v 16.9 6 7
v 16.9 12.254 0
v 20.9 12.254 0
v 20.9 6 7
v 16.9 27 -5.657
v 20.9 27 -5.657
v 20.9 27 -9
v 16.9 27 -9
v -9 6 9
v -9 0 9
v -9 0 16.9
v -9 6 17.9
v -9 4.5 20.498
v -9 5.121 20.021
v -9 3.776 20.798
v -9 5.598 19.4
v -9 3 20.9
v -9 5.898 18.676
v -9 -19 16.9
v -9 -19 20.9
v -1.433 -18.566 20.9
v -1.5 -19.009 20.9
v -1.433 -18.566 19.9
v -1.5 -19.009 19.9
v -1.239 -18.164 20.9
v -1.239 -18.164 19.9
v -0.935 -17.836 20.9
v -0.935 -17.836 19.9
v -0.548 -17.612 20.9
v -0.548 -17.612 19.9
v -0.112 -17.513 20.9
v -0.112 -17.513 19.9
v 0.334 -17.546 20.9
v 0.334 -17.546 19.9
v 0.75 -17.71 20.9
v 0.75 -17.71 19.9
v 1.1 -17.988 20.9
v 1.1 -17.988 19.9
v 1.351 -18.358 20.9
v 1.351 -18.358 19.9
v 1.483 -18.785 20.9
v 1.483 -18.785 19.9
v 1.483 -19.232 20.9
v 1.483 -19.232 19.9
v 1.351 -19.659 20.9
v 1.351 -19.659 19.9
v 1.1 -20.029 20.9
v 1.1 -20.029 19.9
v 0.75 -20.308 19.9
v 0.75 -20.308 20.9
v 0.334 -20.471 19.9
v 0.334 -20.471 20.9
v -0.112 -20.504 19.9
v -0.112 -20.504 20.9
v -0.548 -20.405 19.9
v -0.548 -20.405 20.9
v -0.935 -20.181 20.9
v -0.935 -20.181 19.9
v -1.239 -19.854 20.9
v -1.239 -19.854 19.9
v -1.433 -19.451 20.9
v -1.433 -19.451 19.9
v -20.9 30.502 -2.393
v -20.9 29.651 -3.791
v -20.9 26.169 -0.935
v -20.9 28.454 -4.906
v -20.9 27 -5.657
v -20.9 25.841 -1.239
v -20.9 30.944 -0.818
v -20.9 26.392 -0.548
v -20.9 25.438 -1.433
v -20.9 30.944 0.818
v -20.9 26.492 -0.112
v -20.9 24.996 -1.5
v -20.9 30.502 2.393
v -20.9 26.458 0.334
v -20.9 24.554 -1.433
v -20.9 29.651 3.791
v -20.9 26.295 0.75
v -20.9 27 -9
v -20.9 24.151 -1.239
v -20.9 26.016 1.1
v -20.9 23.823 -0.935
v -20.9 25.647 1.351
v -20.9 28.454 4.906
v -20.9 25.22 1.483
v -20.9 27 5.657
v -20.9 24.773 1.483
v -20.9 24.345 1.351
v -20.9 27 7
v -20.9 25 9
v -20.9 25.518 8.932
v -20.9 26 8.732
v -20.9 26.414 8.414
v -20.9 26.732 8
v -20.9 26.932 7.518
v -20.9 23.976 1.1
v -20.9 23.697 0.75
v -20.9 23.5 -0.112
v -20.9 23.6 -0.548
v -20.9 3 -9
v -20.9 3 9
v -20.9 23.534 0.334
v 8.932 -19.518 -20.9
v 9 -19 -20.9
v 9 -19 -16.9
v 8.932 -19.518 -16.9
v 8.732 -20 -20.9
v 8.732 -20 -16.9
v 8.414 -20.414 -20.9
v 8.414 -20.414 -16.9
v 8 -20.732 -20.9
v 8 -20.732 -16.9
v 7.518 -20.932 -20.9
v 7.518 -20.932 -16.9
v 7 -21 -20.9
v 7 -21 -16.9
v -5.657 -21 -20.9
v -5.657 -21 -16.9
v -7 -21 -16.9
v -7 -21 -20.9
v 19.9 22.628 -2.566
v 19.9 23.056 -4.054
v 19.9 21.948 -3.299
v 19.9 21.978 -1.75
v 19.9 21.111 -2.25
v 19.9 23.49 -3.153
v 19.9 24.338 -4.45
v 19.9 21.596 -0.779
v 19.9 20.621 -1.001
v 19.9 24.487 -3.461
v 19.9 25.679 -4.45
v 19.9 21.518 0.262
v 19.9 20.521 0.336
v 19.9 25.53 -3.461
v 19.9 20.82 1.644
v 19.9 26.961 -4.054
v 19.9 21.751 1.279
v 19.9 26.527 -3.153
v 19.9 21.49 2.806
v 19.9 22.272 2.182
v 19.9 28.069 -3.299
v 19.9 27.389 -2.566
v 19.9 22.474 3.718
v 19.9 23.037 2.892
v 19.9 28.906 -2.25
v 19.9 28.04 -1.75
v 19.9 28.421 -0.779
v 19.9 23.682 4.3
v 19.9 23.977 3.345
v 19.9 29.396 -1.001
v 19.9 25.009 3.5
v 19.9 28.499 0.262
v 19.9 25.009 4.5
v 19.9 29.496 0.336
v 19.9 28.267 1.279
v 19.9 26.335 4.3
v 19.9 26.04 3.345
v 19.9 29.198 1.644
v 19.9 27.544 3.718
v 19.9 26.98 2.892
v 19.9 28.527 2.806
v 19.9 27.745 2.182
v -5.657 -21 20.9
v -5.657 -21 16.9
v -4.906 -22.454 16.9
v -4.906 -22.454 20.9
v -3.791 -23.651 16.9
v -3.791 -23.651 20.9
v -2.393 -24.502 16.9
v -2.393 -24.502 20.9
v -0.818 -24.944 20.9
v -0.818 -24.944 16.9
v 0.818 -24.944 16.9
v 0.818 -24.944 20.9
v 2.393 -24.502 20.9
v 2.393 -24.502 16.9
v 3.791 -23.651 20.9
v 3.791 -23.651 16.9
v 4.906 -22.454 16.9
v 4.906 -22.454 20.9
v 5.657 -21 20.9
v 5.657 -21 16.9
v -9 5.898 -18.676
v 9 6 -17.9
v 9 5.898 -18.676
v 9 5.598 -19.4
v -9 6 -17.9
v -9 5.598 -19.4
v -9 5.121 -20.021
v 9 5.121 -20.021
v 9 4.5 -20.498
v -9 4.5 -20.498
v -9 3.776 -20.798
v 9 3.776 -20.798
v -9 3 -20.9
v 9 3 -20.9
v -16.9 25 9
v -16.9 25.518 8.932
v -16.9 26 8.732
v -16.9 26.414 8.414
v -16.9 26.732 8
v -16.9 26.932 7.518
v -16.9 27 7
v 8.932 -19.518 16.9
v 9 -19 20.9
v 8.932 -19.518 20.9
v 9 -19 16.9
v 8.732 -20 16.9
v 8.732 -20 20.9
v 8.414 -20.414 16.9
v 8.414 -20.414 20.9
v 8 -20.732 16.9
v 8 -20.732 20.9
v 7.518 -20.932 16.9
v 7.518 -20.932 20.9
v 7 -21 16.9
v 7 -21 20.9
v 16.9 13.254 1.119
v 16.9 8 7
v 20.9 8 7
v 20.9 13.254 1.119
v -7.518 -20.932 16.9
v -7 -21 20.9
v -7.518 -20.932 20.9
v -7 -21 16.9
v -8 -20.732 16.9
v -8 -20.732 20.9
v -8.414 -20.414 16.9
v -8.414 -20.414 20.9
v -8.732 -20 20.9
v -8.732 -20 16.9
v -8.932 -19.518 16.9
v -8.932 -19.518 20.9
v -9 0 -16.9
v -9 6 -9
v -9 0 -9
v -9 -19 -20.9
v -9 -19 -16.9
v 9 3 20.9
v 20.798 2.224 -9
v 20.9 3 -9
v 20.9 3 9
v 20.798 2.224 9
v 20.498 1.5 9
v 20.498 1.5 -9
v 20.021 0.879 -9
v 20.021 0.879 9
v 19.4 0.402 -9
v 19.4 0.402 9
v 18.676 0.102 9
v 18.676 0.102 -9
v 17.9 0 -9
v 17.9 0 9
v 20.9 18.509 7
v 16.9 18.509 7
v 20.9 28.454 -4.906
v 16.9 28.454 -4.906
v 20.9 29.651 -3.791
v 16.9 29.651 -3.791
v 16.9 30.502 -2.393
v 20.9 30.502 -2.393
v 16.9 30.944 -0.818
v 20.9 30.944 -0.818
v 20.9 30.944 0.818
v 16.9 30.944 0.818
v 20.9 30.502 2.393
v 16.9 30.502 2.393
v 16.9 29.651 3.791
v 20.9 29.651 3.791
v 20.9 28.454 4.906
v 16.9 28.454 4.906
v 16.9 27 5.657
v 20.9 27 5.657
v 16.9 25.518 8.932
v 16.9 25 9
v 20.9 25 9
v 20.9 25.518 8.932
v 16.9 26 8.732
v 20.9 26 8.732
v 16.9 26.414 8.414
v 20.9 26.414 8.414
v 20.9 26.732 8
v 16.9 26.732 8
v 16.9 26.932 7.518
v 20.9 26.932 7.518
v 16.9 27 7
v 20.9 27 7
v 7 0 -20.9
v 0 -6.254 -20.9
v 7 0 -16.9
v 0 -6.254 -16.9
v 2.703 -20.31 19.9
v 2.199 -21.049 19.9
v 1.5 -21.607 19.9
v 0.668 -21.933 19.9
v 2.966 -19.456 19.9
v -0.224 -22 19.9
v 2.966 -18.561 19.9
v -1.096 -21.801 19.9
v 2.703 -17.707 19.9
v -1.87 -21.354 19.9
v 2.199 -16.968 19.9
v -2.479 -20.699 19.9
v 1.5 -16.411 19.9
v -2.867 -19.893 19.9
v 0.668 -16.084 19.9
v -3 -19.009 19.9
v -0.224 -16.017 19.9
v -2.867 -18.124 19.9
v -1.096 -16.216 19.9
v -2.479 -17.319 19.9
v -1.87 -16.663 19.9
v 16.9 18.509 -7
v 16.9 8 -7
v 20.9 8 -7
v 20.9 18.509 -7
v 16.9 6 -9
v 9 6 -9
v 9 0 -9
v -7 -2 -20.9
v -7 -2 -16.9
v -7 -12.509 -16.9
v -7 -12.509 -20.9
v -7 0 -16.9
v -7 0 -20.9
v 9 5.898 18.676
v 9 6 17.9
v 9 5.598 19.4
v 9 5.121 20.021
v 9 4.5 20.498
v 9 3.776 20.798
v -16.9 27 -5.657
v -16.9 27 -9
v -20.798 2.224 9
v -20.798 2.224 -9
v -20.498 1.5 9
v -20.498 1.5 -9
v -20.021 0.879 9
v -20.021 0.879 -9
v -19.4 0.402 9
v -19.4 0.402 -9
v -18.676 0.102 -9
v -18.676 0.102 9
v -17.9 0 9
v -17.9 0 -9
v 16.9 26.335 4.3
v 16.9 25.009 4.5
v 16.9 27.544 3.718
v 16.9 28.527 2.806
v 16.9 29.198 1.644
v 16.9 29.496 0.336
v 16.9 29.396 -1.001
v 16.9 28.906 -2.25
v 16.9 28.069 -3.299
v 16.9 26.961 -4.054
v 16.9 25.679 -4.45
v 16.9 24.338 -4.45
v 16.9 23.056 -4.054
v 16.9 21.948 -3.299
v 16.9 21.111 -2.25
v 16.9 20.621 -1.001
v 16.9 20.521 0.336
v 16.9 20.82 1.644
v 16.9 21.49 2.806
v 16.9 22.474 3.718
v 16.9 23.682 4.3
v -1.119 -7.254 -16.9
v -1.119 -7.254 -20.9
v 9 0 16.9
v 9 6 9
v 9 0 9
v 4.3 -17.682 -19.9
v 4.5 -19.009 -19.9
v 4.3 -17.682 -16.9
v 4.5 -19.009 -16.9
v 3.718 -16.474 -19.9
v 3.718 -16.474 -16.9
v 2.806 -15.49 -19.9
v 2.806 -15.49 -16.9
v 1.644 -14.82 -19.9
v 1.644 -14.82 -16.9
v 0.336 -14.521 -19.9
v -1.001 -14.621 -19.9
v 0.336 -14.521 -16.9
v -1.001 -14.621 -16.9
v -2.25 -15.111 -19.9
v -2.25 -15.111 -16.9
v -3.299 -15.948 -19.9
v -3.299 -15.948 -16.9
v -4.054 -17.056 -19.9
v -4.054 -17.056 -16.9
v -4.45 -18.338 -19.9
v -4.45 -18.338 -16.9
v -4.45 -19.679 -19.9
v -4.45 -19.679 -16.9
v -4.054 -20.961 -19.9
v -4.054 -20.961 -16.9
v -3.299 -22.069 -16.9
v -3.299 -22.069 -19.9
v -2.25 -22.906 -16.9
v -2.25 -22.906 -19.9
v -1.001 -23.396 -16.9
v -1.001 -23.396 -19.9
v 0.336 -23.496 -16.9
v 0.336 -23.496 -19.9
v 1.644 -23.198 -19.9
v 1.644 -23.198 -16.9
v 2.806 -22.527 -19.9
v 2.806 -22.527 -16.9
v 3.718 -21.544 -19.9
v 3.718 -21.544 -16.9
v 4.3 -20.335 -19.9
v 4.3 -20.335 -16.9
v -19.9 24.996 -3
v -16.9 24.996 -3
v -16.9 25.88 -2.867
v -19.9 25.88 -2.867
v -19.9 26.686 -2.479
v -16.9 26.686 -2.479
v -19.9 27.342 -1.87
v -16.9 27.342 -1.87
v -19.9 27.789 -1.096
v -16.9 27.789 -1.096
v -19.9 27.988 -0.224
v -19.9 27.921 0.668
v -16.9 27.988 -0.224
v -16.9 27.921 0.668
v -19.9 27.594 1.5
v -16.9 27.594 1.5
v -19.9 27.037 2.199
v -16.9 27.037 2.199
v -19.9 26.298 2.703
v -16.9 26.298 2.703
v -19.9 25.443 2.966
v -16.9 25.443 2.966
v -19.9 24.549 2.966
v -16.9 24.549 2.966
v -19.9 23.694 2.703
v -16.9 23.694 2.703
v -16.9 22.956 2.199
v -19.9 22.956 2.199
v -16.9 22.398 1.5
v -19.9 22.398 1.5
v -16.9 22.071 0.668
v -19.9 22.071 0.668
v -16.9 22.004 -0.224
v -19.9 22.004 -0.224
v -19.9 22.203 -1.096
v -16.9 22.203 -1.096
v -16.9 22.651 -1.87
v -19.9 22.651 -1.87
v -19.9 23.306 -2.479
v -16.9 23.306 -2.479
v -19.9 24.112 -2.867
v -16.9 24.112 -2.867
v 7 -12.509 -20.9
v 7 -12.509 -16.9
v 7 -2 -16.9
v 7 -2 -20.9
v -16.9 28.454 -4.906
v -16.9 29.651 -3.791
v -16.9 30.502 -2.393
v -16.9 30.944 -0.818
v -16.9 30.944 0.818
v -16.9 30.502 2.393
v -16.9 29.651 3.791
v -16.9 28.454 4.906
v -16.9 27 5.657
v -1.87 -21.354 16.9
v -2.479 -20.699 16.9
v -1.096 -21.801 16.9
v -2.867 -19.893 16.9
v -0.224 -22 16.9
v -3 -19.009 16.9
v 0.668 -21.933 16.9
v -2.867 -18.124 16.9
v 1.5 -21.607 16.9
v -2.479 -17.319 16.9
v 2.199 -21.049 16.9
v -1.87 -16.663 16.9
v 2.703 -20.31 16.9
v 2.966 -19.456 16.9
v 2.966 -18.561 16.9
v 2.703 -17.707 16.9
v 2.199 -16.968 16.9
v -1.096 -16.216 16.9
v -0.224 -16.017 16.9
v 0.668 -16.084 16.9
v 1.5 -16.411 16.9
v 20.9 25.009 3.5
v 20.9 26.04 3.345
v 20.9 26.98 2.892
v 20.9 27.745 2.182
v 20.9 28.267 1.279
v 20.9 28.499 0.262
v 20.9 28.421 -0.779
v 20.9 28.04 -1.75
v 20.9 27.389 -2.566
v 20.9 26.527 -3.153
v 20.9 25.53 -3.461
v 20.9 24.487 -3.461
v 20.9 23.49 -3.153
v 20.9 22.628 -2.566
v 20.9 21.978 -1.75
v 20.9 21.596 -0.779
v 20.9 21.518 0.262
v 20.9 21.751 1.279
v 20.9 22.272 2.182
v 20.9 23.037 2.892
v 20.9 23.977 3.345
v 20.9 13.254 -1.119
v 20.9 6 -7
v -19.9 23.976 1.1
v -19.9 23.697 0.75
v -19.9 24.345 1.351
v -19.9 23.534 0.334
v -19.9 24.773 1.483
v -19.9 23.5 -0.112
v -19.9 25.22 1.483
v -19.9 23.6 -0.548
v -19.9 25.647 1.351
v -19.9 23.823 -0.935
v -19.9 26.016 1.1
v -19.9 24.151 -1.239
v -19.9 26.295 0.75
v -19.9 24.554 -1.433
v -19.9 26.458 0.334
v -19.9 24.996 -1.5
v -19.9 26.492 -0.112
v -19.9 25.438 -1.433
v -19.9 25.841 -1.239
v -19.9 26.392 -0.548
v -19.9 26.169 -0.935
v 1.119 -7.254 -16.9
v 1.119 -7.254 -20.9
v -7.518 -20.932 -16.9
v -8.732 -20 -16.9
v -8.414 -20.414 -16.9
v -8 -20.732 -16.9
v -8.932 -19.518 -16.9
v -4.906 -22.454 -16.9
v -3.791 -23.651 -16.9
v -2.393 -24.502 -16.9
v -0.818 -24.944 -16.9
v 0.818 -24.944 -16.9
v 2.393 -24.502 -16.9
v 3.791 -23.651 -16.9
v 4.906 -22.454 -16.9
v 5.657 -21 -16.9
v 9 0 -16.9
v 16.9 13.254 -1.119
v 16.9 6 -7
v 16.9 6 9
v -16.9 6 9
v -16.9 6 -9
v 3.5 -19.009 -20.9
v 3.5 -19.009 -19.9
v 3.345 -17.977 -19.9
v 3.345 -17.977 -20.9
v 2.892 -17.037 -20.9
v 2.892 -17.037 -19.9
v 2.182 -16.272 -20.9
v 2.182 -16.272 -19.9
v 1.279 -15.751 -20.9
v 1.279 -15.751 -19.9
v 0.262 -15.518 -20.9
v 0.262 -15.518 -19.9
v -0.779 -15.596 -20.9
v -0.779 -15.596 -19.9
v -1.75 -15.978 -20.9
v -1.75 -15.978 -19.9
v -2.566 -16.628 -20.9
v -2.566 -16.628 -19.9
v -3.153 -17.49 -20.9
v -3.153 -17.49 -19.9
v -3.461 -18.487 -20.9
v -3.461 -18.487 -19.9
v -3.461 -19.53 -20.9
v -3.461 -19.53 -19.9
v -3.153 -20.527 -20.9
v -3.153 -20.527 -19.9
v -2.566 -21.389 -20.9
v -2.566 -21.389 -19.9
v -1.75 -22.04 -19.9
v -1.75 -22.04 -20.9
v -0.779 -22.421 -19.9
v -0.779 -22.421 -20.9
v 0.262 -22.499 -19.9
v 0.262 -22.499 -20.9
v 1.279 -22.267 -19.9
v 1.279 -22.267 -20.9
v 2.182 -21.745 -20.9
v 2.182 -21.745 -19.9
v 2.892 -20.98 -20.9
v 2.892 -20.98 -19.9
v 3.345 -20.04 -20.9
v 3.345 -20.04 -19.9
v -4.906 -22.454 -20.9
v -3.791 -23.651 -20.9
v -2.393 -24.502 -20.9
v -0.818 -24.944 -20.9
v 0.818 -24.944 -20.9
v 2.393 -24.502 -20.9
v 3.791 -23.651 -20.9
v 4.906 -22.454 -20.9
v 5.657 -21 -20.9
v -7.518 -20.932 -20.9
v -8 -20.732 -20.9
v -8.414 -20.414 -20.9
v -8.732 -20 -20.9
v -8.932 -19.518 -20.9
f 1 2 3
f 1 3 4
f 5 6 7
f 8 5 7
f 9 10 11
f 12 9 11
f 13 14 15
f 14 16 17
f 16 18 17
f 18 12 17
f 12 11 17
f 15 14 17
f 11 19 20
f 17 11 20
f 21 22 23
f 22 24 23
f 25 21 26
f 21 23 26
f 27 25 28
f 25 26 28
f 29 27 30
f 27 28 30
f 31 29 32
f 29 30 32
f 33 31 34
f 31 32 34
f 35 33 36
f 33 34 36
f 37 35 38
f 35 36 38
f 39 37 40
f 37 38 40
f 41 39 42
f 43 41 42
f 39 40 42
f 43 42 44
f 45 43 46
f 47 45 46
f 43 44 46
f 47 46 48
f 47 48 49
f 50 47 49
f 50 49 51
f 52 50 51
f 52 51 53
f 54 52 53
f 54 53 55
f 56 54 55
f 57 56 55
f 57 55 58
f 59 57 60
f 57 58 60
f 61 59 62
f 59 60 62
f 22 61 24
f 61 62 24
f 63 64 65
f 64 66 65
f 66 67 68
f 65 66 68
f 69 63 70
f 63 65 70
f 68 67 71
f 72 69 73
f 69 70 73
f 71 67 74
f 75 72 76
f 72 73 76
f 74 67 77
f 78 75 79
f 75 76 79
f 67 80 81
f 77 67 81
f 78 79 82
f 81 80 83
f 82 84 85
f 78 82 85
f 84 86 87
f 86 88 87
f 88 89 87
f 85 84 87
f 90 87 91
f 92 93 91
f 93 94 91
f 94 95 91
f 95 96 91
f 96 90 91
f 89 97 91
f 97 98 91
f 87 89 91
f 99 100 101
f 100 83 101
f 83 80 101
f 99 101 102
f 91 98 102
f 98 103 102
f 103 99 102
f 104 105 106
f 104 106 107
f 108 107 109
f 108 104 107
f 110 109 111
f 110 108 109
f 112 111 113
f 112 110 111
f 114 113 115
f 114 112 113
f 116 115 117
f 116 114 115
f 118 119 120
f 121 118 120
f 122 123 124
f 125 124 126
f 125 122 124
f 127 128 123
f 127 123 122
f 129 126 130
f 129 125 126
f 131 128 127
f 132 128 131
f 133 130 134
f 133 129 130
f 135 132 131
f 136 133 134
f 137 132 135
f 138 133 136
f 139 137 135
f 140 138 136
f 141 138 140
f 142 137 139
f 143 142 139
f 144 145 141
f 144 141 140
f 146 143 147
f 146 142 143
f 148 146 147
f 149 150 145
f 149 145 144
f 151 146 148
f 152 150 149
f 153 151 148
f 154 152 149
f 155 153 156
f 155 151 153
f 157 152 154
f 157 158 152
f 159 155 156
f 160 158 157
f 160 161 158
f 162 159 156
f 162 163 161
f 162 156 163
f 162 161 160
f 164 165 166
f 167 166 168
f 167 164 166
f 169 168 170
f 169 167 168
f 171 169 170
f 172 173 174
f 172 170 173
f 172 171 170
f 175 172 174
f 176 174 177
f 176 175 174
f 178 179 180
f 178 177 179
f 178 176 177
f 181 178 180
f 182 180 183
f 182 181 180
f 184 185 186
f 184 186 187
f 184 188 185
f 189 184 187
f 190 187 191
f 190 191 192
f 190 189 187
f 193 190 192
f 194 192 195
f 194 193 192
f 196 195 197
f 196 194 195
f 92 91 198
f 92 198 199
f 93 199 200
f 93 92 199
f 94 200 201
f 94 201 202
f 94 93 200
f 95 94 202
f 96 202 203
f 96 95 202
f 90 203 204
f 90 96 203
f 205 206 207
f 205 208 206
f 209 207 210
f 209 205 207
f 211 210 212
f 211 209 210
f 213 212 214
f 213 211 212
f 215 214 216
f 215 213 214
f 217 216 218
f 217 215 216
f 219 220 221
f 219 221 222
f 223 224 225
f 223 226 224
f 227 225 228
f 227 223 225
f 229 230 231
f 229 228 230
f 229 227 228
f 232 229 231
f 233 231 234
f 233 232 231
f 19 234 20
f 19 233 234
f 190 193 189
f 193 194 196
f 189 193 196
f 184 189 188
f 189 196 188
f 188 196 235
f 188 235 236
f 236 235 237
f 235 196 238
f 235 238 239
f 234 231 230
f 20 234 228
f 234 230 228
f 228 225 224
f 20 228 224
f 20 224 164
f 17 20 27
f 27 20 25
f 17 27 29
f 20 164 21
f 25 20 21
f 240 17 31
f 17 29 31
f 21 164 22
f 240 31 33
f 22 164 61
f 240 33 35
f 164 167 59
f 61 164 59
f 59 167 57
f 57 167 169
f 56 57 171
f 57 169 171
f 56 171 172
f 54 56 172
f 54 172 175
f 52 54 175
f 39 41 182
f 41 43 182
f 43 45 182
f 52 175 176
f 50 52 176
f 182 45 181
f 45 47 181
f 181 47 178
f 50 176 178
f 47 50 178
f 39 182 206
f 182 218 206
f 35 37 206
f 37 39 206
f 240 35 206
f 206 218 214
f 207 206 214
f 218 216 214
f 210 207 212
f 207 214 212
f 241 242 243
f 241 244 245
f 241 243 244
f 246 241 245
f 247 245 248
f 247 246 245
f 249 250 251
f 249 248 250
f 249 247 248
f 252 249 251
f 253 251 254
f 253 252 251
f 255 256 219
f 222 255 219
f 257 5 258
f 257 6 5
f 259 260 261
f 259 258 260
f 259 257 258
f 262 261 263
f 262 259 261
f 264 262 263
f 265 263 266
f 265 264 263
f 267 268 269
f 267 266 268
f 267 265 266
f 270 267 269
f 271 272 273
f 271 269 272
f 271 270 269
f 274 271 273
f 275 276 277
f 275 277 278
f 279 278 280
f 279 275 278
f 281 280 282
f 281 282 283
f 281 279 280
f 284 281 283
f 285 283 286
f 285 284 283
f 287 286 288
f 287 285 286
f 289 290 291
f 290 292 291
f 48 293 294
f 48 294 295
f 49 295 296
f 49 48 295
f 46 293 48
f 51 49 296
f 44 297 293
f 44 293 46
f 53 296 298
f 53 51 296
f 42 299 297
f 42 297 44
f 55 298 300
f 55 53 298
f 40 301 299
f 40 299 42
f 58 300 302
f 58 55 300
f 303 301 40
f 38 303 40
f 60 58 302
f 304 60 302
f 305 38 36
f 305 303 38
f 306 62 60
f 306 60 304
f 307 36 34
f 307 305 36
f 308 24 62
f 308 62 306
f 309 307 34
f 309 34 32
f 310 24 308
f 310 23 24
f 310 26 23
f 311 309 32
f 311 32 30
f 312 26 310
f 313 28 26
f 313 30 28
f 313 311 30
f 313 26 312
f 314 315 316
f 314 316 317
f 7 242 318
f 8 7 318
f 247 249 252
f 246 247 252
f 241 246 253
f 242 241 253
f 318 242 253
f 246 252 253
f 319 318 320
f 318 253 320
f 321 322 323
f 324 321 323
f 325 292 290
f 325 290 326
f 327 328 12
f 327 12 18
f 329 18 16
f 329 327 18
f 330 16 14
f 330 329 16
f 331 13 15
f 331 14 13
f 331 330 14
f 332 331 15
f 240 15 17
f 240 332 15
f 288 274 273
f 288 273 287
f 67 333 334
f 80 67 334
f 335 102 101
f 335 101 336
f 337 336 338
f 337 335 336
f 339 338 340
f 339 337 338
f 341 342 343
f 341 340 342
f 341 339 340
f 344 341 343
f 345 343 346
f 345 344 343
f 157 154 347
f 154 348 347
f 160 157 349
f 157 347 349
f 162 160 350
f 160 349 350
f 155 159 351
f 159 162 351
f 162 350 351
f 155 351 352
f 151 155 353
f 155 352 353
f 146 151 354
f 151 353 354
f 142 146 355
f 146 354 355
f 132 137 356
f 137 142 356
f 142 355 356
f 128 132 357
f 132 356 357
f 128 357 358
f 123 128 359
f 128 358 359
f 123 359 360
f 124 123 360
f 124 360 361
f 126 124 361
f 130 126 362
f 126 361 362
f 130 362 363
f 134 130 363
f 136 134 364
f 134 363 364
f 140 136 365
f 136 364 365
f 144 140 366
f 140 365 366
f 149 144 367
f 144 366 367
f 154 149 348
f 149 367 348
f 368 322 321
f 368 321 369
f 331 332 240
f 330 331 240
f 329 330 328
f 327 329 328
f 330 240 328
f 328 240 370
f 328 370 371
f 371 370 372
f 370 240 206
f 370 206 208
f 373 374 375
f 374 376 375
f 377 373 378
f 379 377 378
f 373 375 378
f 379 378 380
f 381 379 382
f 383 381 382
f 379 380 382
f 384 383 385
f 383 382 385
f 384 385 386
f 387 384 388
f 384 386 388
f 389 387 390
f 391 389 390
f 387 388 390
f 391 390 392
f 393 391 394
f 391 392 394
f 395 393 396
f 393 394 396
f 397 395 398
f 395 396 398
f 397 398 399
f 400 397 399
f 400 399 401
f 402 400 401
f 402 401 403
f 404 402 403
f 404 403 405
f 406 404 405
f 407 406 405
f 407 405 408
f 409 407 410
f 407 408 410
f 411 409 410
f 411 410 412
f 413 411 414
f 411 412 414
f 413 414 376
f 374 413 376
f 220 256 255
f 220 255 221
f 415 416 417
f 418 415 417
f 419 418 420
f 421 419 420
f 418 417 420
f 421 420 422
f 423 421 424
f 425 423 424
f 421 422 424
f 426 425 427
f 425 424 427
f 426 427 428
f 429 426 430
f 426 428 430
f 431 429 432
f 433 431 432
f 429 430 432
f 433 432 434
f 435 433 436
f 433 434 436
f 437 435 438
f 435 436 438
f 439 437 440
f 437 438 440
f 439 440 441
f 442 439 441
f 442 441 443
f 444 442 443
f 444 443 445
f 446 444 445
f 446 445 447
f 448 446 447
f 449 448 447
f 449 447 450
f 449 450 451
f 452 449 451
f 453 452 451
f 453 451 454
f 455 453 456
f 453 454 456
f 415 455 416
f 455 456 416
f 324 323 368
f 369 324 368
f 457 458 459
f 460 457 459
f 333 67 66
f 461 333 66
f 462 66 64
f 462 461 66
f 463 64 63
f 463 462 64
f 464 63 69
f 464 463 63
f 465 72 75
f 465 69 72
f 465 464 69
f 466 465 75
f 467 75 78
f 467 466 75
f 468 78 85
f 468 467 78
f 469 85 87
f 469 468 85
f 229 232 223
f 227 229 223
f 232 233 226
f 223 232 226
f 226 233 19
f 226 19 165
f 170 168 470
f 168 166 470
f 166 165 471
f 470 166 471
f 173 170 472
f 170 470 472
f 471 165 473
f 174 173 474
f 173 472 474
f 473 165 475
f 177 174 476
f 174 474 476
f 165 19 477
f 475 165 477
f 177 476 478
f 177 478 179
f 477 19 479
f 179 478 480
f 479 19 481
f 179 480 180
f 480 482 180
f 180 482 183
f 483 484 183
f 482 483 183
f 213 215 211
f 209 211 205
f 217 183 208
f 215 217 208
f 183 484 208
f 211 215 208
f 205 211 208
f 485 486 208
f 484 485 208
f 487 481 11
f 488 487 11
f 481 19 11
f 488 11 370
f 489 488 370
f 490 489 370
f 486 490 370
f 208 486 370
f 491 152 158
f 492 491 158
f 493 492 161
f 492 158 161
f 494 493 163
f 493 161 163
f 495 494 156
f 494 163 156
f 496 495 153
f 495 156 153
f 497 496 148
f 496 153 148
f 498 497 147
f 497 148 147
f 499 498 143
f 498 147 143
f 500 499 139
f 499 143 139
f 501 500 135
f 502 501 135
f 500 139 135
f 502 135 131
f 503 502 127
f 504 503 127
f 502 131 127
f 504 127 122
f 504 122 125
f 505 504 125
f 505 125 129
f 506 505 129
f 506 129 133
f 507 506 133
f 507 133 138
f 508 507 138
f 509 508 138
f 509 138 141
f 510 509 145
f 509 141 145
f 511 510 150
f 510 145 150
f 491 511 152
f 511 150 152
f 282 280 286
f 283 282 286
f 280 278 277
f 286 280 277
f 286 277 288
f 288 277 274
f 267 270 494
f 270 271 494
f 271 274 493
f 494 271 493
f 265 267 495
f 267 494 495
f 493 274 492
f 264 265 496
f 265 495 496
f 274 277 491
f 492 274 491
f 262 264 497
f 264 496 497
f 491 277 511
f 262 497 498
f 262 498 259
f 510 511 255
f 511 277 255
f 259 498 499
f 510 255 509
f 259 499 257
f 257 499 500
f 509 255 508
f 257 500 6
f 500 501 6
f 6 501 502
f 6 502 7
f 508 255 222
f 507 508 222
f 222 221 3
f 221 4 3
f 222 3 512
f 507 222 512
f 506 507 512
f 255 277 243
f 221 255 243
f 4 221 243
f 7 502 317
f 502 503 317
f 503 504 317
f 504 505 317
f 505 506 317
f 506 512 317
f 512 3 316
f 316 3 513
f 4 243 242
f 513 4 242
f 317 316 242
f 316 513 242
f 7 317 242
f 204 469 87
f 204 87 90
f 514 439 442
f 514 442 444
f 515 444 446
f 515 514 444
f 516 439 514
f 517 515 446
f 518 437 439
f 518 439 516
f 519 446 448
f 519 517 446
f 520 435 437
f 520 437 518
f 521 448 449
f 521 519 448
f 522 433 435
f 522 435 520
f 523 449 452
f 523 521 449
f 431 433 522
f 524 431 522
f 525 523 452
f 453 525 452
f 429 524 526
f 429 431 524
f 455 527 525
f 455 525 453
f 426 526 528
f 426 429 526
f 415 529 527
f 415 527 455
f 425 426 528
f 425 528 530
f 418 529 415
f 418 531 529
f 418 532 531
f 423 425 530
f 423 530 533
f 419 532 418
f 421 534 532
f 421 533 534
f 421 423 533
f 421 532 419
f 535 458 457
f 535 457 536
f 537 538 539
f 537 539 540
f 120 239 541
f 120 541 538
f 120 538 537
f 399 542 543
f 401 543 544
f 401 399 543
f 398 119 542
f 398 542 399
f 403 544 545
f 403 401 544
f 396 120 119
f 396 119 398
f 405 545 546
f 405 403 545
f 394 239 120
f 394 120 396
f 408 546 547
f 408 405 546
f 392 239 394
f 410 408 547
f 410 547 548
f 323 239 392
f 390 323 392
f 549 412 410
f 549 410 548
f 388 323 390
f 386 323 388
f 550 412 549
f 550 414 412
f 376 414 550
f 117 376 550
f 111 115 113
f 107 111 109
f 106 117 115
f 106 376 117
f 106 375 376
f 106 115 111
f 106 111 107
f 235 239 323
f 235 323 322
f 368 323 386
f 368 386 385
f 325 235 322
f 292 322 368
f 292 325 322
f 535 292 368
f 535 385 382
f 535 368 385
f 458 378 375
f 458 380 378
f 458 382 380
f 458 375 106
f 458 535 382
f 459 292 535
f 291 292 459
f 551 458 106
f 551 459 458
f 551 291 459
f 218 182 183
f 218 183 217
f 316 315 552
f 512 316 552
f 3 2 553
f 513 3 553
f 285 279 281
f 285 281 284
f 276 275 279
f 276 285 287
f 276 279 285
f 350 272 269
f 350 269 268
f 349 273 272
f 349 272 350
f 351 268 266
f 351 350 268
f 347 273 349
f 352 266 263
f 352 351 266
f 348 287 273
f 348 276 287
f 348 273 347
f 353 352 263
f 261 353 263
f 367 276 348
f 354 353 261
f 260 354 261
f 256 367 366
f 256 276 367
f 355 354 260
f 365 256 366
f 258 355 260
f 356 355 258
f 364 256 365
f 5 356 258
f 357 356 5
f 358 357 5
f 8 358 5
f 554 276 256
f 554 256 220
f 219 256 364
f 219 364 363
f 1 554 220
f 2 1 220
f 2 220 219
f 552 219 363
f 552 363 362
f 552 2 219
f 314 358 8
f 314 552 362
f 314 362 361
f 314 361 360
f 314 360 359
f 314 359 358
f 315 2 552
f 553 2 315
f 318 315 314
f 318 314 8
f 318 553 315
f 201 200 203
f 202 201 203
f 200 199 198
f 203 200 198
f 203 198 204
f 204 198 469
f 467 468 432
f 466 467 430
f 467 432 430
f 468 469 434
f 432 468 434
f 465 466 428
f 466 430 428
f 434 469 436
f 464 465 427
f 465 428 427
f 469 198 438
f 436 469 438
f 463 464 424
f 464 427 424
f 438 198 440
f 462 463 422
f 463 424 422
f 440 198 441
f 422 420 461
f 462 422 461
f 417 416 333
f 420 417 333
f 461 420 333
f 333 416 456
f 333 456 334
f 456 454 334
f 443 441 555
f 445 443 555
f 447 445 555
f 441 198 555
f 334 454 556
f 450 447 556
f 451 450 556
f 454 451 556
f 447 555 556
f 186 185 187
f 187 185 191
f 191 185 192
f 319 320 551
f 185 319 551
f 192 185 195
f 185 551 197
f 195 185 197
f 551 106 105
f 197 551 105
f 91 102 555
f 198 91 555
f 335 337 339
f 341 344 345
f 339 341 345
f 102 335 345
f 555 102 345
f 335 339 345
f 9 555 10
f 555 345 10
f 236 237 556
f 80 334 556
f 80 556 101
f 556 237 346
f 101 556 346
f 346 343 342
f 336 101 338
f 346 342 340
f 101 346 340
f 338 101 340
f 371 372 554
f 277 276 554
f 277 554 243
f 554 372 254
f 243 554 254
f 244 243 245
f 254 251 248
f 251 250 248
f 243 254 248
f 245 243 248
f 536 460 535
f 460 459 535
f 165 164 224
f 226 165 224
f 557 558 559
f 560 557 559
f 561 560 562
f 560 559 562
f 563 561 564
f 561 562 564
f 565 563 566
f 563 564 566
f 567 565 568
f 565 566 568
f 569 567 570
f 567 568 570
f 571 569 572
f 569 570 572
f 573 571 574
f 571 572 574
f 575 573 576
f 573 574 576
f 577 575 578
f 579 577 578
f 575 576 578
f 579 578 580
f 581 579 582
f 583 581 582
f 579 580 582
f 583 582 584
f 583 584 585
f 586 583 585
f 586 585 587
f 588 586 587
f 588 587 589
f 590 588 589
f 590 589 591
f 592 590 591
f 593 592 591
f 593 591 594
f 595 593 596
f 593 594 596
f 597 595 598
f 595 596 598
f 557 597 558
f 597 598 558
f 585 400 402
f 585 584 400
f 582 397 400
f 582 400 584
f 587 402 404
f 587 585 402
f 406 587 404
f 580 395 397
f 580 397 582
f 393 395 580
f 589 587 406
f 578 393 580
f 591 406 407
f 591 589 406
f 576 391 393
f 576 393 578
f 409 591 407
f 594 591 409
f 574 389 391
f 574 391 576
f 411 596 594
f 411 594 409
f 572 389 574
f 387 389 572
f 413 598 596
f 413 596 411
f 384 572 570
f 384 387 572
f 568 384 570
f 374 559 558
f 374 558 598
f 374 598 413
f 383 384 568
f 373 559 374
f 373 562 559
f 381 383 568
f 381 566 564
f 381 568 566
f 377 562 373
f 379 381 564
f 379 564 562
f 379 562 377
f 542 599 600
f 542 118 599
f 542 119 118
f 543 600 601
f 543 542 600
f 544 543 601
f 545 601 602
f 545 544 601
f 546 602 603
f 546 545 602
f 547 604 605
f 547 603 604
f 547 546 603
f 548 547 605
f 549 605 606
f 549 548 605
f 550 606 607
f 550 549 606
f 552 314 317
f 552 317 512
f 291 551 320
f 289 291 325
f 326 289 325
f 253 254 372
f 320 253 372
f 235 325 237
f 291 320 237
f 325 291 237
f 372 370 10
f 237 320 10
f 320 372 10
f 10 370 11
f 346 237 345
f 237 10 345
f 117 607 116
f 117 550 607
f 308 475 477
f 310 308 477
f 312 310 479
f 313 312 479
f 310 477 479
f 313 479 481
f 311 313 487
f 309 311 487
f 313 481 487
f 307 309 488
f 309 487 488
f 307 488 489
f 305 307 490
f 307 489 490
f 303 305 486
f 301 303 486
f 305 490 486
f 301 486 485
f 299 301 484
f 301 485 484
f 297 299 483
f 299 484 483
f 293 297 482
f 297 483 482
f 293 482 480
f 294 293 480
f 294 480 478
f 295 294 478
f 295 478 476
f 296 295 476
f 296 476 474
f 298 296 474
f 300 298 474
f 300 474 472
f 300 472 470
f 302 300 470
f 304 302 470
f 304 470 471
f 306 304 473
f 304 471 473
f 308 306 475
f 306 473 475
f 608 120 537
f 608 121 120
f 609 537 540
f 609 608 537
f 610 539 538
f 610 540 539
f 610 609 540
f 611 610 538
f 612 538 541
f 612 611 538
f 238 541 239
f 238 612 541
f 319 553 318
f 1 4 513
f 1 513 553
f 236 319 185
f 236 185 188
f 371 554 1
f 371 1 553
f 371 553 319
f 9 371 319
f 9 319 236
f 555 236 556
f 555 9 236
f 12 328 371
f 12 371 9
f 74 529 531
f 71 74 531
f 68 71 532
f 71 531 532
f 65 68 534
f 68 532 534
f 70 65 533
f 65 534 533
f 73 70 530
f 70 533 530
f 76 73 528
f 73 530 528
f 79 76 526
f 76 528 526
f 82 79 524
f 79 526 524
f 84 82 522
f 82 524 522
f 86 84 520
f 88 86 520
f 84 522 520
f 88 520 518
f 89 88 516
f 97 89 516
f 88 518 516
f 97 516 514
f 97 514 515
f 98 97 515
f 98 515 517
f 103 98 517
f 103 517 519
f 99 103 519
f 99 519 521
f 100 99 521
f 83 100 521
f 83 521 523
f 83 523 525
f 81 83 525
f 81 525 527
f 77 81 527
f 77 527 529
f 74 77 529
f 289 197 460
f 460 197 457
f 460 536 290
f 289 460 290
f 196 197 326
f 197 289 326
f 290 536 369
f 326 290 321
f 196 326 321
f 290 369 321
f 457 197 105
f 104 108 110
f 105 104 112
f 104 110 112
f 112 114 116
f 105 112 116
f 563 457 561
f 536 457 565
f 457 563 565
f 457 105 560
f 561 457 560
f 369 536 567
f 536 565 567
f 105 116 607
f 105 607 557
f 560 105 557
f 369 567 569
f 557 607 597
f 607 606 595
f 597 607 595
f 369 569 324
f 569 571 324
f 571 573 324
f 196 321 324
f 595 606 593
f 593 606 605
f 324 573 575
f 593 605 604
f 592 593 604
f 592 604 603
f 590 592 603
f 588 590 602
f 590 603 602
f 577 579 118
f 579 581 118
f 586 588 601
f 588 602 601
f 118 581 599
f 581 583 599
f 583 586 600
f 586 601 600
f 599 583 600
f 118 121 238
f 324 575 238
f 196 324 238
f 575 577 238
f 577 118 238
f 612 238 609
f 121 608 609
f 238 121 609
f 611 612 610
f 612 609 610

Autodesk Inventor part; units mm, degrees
ref_plane "YZ Plane" through (0, 0, 0) normal (1, 0, 0) x (0, 1, 0)
ref_plane "XZ Plane" through (0, 0, 0) normal (0, 1, 0) x (-1, 0, 0)
ref_plane "XY Plane" through (0, 0, 0) normal (0, 0, 1) x (1, 0, 0)
sketch "スケッチ1" plane through (0, 0, 0) normal (0, 1, 0) x (-1, 0, 0)
  line L0 (9, 20.9) -> (-9, 20.9)
  line L1 (-9, -20.9) -> (9, -20.9)
  line L2 (9, 20.9) -> (-9, -20.9) construction
  line L3 (-9, 20.9) -> (9, -20.9) construction
  line L4 (-20.9, 9) -> (-20.9, -9)
  line L5 (20.9, -9) -> (20.9, 9)
  line L6 (20.9, 9) -> (-20.9, -9) construction
  line L7 (-20.9, 9) -> (20.9, -9) construction
  line L8 (20.9, 9) -> (9, 9)
  line L9 (-9, 9) -> (-20.9, 9)
  line L10 (9, 9) -> (9, 20.9)
  line L11 (-9, 20.9) -> (-9, 9)
  line L12 (-9, -9) -> (-9, -20.9)
  line L13 (-20.9, -9) -> (-9, -9)
  line L14 (9, -9) -> (20.9, -9)
  line L15 (9, -20.9) -> (9, -9)
  point P0 (0, 0)
  dimension "d0" = 18
  dimension "d1" = 41.8
  dimension "d2" = 41.8
  dimension "d3" = 18
extrude "押し出し1" add sketch "スケッチ1" along normal blind 6
sketch "スケッチ2" plane through (0, 6, 0) normal (0, 1, 0) x (1, 0, 0)
  line L0 (-20.9, -9) -> (-9, -9) projected
  line L1 (-9, 9) -> (-20.9, 9) projected
  line L2 (-20.9, -9) -> (-16.9, -9)
  line L3 (-16.9, -9) -> (-16.9, 9)
  line L4 (-16.9, 9) -> (-20.9, 9)
  line L5 (-20.9, 9) -> (-20.9, -9)
  line L6 (20.9, -9) -> (20.9, 9) projected
  line L7 (20.9, 9) -> (9, 9) projected
  line L8 (20.9, -9) -> (16.9, -9)
  line L9 (16.9, -9) -> (16.9, 9)
  line L10 (16.9, 9) -> (20.9, 9)
  line L11 (20.9, 9) -> (20.9, -9)
  point P0 (0, 0)
  dimension "d6" = 4
  dimension "d7" = 4
extrude "押し出し2" add sketch "スケッチ2" along normal blind 25
sketch "スケッチ3" plane through (0, 0, 0) normal (0, -1, 0) x (1, 0, 0)
  line L0 (-9, 20.9) -> (9, 20.9) projected
  line L1 (-9, 9) -> (-9, 20.9) projected
  line L2 (9, 20.9) -> (-9, 20.9)
  line L3 (-9, 20.9) -> (-9, 16.9)
  line L4 (-9, 16.9) -> (9, 16.9)
  line L5 (9, 16.9) -> (9, 20.9)
  line L6 (9, -9) -> (9, -20.9) projected
  line L7 (-9, -20.9) -> (-9, -9) projected
  line L8 (9, -20.9) -> (-9, -20.9)
  line L9 (-9, -20.9) -> (-9, -16.9)
  line L10 (-9, -16.9) -> (9, -16.9)
  line L11 (9, -16.9) -> (9, -20.9)
  point P0 (0, 0)
  dimension "d10" = 4
  dimension "d11" = 4
extrude "押し出し3" add sketch "スケッチ3" along normal blind 25
sketch "スケッチ4" plane through (20.9, 0, 9) normal (1, 0, 0) x (0, 0, -1)
  line L0 (9, 0) -> (9, 25) construction
  line L1 (9, 25) -> (15, 25) construction
  line L2 (9, 25) -> (0, 25) construction
  line L3 (0, 6) -> (0, 31) construction
  line L4 (0, 25) -> (2, 25) construction
  line L5 (9, 25) -> (18, 25) construction
  line L6 (18, 0) -> (18, 31) construction
  line L7 (18, 25) -> (16, 25) construction
  line L8 (2, 25) -> (0, 25) construction
  line L9 (18, 31) -> (0, 31) construction
  line L10 (9, 25) -> (9, 31) construction
  line L11 (0, 31) -> (18, 31) construction
  line L12 (0, 6) -> (0, 31) construction
  line L13 (0, 25) -> (0, 31) construction
  line L14 (18, 31) -> (0, 31) construction
  line L15 (0, 31) -> (18, 31) construction
  line L16 (18, 31) -> (18, 25) construction
  line L17 (0, 0) -> (0, 31) projected
  line L18 (0, 25) -> (0, 31)
  line L19 (0, 31) -> (18, 31)
  line L20 (18, 25) -> (18, 31)
  circle A0 centre (9, 25) radius 6
  line L21 (2, 27) -> (0, 27)
  line L22 (16, 27) -> (18, 27)
  line L23 (18, 6) -> (18, 31) projected
  line L24 (2, 27) -> (3.3431, 27)
  line L25 (14.6569, 27) -> (16, 27)
  circle A1 centre (9, 25) radius 1.5
  circle A2 centre (9, 25) radius 3
  dimension "d14" = 25
  dimension "d20" = 2
  dimension "d21" = 2
  dimension "d22" = 6
  dimension "d24" = 12
  dimension "d35" = 3
  dimension "d36" = 6
extrude "押し出し4" cut sketch "スケッチ4" against normal blind 41.8 contours L17 L19 A0 L24 L21 | L19 L20 L22 L25 A0
sketch "スケッチ5" plane through (-9, 6, 20.9) normal (0, 0, 1) x (1, 0, 0)
  line L0 (18, -31) -> (18, 0) projected
  line L1 (0, 0) -> (18, 0) projected
  line L2 (18, 0) -> (0, 0)
  line L3 (9, 0) -> (9, -25) construction
  line L4 (9, -25) -> (15, -25) construction
  line L5 (9, -25) -> (0, -25) construction
  line L6 (0, -6) -> (0, -31) construction
  line L7 (0, -25) -> (2, -25) construction
  line L8 (9, -25) -> (18, -25) construction
  line L9 (18, 0) -> (18, -31) construction
  line L10 (18, -25) -> (16, -25) construction
  line L11 (2, -25) -> (0, -25) construction
  line L12 (18, -31) -> (0, -31) construction
  line L13 (9, -25) -> (9, -31) construction
  line L14 (0, -31) -> (18, -31) construction
  line L15 (0, -6) -> (0, -31) construction
  line L16 (0, -25) -> (0, -31) construction
  line L17 (18, -31) -> (0, -31) construction
  line L18 (0, -31) -> (18, -31) construction
  line L19 (18, -31) -> (18, -25) construction
  line L20 (0, 0) -> (0, -31)
  line L21 (0, -25) -> (0, -31)
  line L22 (0, -31) -> (18, -31)
  line L23 (18, -25) -> (18, -31)
  circle A0 centre (9, -25) radius 6
  line L24 (2, -27) -> (0, -27)
  line L25 (16, -27) -> (18, -27)
  line L26 (18, -6) -> (18, -31)
  line L27 (2, -27) -> (3.3431, -27)
  line L28 (14.6569, -27) -> (16, -27)
  point P0 (9, -6)
extrude "押し出し5" cut sketch "スケッチ5" against normal blind 41.8 contours L22 A0 L28 L25 L0 | L22 L20 L24 L27 A0
sketch "スケッチ6" plane through (-16.9, 6, 9) normal (1, 0, 0) x (0, 0, -1)
  line L0 (9, -0.0039) -> (9, 18.9961) construction
  line L1 (9, 18.9961) -> (15, 18.9961) construction
  line L2 (9, 18.9961) -> (0, 18.9961) construction
  line L3 (0, -0.0039) -> (0, 24.9961) construction
  line L4 (0, 18.9961) -> (2, 18.9961) construction
  line L5 (9, 18.9961) -> (18, 18.9961) construction
  line L6 (18, 18.9961) -> (18, 24.9961) construction
  line L7 (18, 18.9961) -> (16, 18.9961) construction
  line L8 (2, 18.9961) -> (0, 18.9961) construction
  line L9 (18, 24.9961) -> (0, 24.9961) construction
  line L10 (9, 18.9961) -> (9, 24.9961) construction
  line L11 (0, 24.9961) -> (18, 24.9961) construction
  line L12 (0, -0.0039) -> (0, 24.9961) construction
  line L13 (0, 18.9961) -> (0, 24.9961) construction
  line L14 (18, 24.9961) -> (0, 24.9961) construction
  line L15 (0, 24.9961) -> (18, 24.9961) construction
  line L16 (18, 24.9961) -> (18, 18.9961) construction
  line L17 (0, 18.9961) -> (0, 24.9961)
  line L18 (0, 18.9961) -> (0, 24.9961)
  line L19 (0, 24.9961) -> (18, 24.9961)
  line L20 (18, 18.9961) -> (18, 24.9961)
  circle A0 centre (9, 18.9961) radius 6
  line L21 (2, 20.9961) -> (0, 20.9961)
  line L22 (16, 20.9961) -> (18, 20.9961)
  line L23 (18, -0.0039) -> (18, 24.9961)
  line L24 (2, 20.9961) -> (3.3431, 20.9961)
  line L25 (14.6569, 20.9961) -> (16, 20.9961)
  circle A1 centre (9, 18.9961) radius 1.5
  circle A2 centre (9, 18.9961) radius 3
  point P0 (9, -6)
  dimension "d37" = 19
  dimension "d38" = 2
  dimension "d39" = 2
  dimension "d40" = 6
  dimension "d41" = 12
  dimension "d42" = 3
  dimension "d43" = 6
extrude "押し出し6" cut sketch "スケッチ6" against normal blind 4 and the other way blind 4 contours A1
sketch "スケッチ7" plane through (-16.9, 6, 9) normal (1, 0, 0) x (0, 0, -1)
  line L0 (9, -0.0039) -> (9, 18.9961) construction
  line L1 (9, 18.9961) -> (15, 18.9961) construction
  line L2 (9, 18.9961) -> (0, 18.9961) construction
  line L3 (0, -0.0039) -> (0, 24.9961) construction
  line L4 (0, 18.9961) -> (2, 18.9961) construction
  line L5 (9, 18.9961) -> (18, 18.9961) construction
  line L6 (18, 18.9961) -> (18, 24.9961) construction
  line L7 (18, 18.9961) -> (16, 18.9961) construction
  line L8 (2, 18.9961) -> (0, 18.9961) construction
  line L9 (18, 24.9961) -> (0, 24.9961) construction
  line L10 (9, 18.9961) -> (9, 24.9961) construction
  line L11 (0, 24.9961) -> (18, 24.9961) construction
  line L12 (0, -0.0039) -> (0, 24.9961) construction
  line L13 (0, 18.9961) -> (0, 24.9961) construction
  line L14 (18, 24.9961) -> (0, 24.9961) construction
  line L15 (0, 24.9961) -> (18, 24.9961) construction
  line L16 (18, 24.9961) -> (18, 18.9961) construction
  line L17 (0, 18.9961) -> (0, 24.9961)
  line L18 (0, 18.9961) -> (0, 24.9961)
  line L19 (0, 24.9961) -> (18, 24.9961)
  line L20 (18, 18.9961) -> (18, 24.9961)
  circle A0 centre (9, 18.9961) radius 6
  line L21 (2, 20.9961) -> (0, 20.9961)
  line L22 (16, 20.9961) -> (18, 20.9961)
  line L23 (18, -0.0039) -> (18, 24.9961)
  line L24 (2, 20.9961) -> (3.3431, 20.9961)
  line L25 (14.6569, 20.9961) -> (16, 20.9961)
  circle A1 centre (9, 18.9961) radius 1.5
  circle A2 centre (9, 18.9961) radius 3
  point P0 (9, -6)
  point P1 (9, -6)
  dimension "d48" = 19
  dimension "d49" = 2
  dimension "d50" = 2
  dimension "d51" = 6
  dimension "d52" = 12
  dimension "d53" = 3
  dimension "d54" = 6
extrude "押し出し7" cut sketch "スケッチ7" against normal blind 3 and the other way blind 3 contours A2
sketch "スケッチ8" plane through (9, 0, 16.9) normal (0, 0, -1) x (-1, 0, 0)
  line L0 (18, -25.0086) -> (18, -19.0086)
  line L1 (18, -25.0086) -> (18, -19.0086) construction
  line L2 (18, -19.0086) -> (18, -25.0086)
  line L3 (9, -19.0086) -> (15, -19.0086) construction
  line L4 (9, -19.0086) -> (18, -19.0086) construction
  line L5 (16, -21.0086) -> (18, -21.0086)
  line L6 (14.6569, -21.0086) -> (16, -21.0086)
  line L7 (9, -19.0086) -> (9, -25.0086) construction
  line L8 (2, -21.0086) -> (3.3431, -21.0086)
  line L9 (9, -19.0086) -> (0, -19.0086) construction
  line L10 (0, -19.0086) -> (0, -25.0086) construction
  line L11 (0, -19.0086) -> (0, -25.0086)
  circle A0 centre (9, -19.0086) radius 6
  line L12 (18, -19.0086) -> (18, -25.0086)
  line L13 (0, -19.0086) -> (0, -25.0086) construction
  line L14 (18, -19.0086) -> (18, -25.0086) construction
  line L15 (9, 0) -> (9, -25) construction
  line L16 (0, -19.0086) -> (0, -25.0086)
  line L17 (0, -0.0086) -> (0, -25.0086) construction
  line L18 (18, -25.0086) -> (0, -25.0086) construction
  line L19 (0, -25.0086) -> (18, -25.0086) construction
  line L20 (0, -25.0086) -> (18, -25.0086)
  line L21 (18, -25.0086) -> (0, -25.0086) construction
  line L22 (0, -25.0086) -> (18, -25.0086) construction
  line L23 (0, -19.0086) -> (2, -19.0086) construction
  line L24 (2, -19.0086) -> (0, -19.0086) construction
  line L25 (18, -19.0086) -> (16, -19.0086) construction
  line L26 (2, -21.0086) -> (0, -21.0086)
  circle A1 centre (9, -19.0086) radius 1.5
  circle A2 centre (9, -19.0086) radius 3
  point P0 (9, -0.0086)
  dimension "d59" = 3
  dimension "d60" = 6
extrude "押し出し8" cut sketch "スケッチ8" against normal blind 3 and the other way blind 3 contours A2
sketch "スケッチ9" plane through (9, 0, 16.9) normal (0, 0, -1) x (-1, 0, 0)
  line L0 (18, -25.0086) -> (18, -19.0086)
  line L1 (18, -25.0086) -> (18, -19.0086) construction
  line L2 (18, -19.0086) -> (18, -25.0086)
  line L3 (9, -19.0086) -> (15, -19.0086) construction
  line L4 (9, -19.0086) -> (18, -19.0086) construction
  line L5 (16, -21.0086) -> (18, -21.0086)
  line L6 (14.6569, -21.0086) -> (16, -21.0086)
  line L7 (9, -19.0086) -> (9, -25.0086) construction
  line L8 (2, -21.0086) -> (3.3431, -21.0086)
  line L9 (9, -19.0086) -> (0, -19.0086) construction
  line L10 (0, -19.0086) -> (0, -25.0086) construction
  line L11 (0, -19.0086) -> (0, -25.0086)
  circle A0 centre (9, -19.0086) radius 6
  line L12 (18, -19.0086) -> (18, -25.0086)
  line L13 (0, -19.0086) -> (0, -25.0086) construction
  line L14 (18, -19.0086) -> (18, -25.0086) construction
  line L15 (9, 0) -> (9, -25) construction
  line L16 (0, -19.0086) -> (0, -25.0086)
  line L17 (0, -0.0086) -> (0, -25.0086) construction
  line L18 (18, -25.0086) -> (0, -25.0086) construction
  line L19 (0, -25.0086) -> (18, -25.0086) construction
  line L20 (0, -25.0086) -> (18, -25.0086)
  line L21 (18, -25.0086) -> (0, -25.0086) construction
  line L22 (0, -25.0086) -> (18, -25.0086) construction
  line L23 (0, -19.0086) -> (2, -19.0086) construction
  line L24 (2, -19.0086) -> (0, -19.0086) construction
  line L25 (18, -19.0086) -> (16, -19.0086) construction
  line L26 (2, -21.0086) -> (0, -21.0086)
  circle A1 centre (9, -19.0086) radius 1.5
  circle A2 centre (9, -19.0086) radius 3
  point P0 (9, -0.0086)
  dimension "d65" = 3
  dimension "d66" = 6
extrude "押し出し9" cut sketch "スケッチ9" against normal blind 4 and the other way blind 37.8 contours A1
sketch "スケッチ10" plane through (-9, 0, -16.9) normal (0, 0, 1) x (1, 0, 0)
  line L0 (18, -25.0086) -> (18, -19.0086)
  line L1 (18, -25.0086) -> (18, -19.0086) construction
  line L2 (18, -19.0086) -> (18, -25.0086)
  line L3 (9, -19.0086) -> (15, -19.0086) construction
  line L4 (9, -19.0086) -> (18, -19.0086) construction
  line L5 (16, -21.0086) -> (18, -21.0086)
  line L6 (14.6569, -21.0086) -> (16, -21.0086)
  line L7 (9, -19.0086) -> (9, -25.0086) construction
  line L8 (2, -21.0086) -> (3.3431, -21.0086)
  line L9 (9, -19.0086) -> (0, -19.0086) construction
  line L10 (0, -19.0086) -> (0, -25.0086) construction
  line L11 (0, -19.0086) -> (0, -25.0086)
  circle A0 centre (9, -19.0086) radius 6
  line L12 (18, -19.0086) -> (18, -25.0086)
  line L13 (0, -19.0086) -> (0, -25.0086) construction
  line L14 (18, -19.0086) -> (18, -25.0086) construction
  line L15 (9, 0) -> (9, -25) construction
  line L16 (0, -19.0086) -> (0, -25.0086)
  line L17 (0, -0.0086) -> (0, -25.0086) construction
  line L18 (18, -25.0086) -> (0, -25.0086) construction
  line L19 (0, -25.0086) -> (18, -25.0086) construction
  line L20 (0, -25.0086) -> (18, -25.0086)
  line L21 (18, -25.0086) -> (0, -25.0086) construction
  line L22 (0, -25.0086) -> (18, -25.0086) construction
  line L23 (0, -19.0086) -> (2, -19.0086) construction
  line L24 (2, -19.0086) -> (0, -19.0086) construction
  line L25 (18, -19.0086) -> (16, -19.0086) construction
  line L26 (2, -21.0086) -> (0, -21.0086)
  circle A1 centre (9, -19.0086) radius 3.5
  circle A2 centre (9, -19.0086) radius 4.5
  point P0 (9, -0.0086)
  dimension "d71" = 7
  dimension "d72" = 9
extrude "押し出し10" cut sketch "スケッチ10" against normal blind 4 contours A1
sketch "スケッチ11" plane through (-9, 0, -16.9) normal (0, 0, 1) x (1, 0, 0)
  line L0 (18, -25.0086) -> (18, -19.0086)
  line L1 (18, -25.0086) -> (18, -19.0086) construction
  line L2 (18, -19.0086) -> (18, -25.0086)
  line L3 (9, -19.0086) -> (15, -19.0086) construction
  line L4 (9, -19.0086) -> (18, -19.0086) construction
  line L5 (16, -21.0086) -> (18, -21.0086)
  line L6 (14.6569, -21.0086) -> (16, -21.0086)
  line L7 (9, -19.0086) -> (9, -25.0086) construction
  line L8 (2, -21.0086) -> (3.3431, -21.0086)
  line L9 (9, -19.0086) -> (0, -19.0086) construction
  line L10 (0, -19.0086) -> (0, -25.0086) construction
  line L11 (0, -19.0086) -> (0, -25.0086)
  circle A0 centre (9, -19.0086) radius 6
  line L12 (18, -19.0086) -> (18, -25.0086)
  line L13 (0, -19.0086) -> (0, -25.0086) construction
  line L14 (18, -19.0086) -> (18, -25.0086) construction
  line L15 (9, 0) -> (9, -25) construction
  line L16 (0, -19.0086) -> (0, -25.0086)
  line L17 (0, -0.0086) -> (0, -25.0086) construction
  line L18 (18, -25.0086) -> (0, -25.0086) construction
  line L19 (0, -25.0086) -> (18, -25.0086) construction
  line L20 (0, -25.0086) -> (18, -25.0086)
  line L21 (18, -25.0086) -> (0, -25.0086) construction
  line L22 (0, -25.0086) -> (18, -25.0086) construction
  line L23 (0, -19.0086) -> (2, -19.0086) construction
  line L24 (2, -19.0086) -> (0, -19.0086) construction
  line L25 (18, -19.0086) -> (16, -19.0086) construction
  line L26 (2, -21.0086) -> (0, -21.0086)
  circle A1 centre (9, -19.0086) radius 3.5
  circle A2 centre (9, -19.0086) radius 4.5
  point P0 (9, -0.0086)
  dimension "d75" = 7
  dimension "d76" = 9
extrude "押し出し11" cut sketch "スケッチ11" against normal blind 3 contours A2
sketch "スケッチ12" plane through (-9, 0, -16.9) normal (0, 0, 1) x (1, 0, 0)
  line L0 (18, -25.0086) -> (18, -19.0086)
  line L1 (18, -25.0086) -> (18, -19.0086) construction
  line L2 (18, -19.0086) -> (18, -25.0086)
  line L3 (9, -19.0086) -> (15, -19.0086) construction
  line L4 (9, -19.0086) -> (18, -19.0086) construction
  line L5 (16, -21.0086) -> (18, -21.0086)
  line L6 (14.6569, -21.0086) -> (16, -21.0086)
  line L7 (9, -19.0086) -> (9, -25.0086) construction
  line L8 (2, -21.0086) -> (3.3431, -21.0086)
  line L9 (9, -19.0086) -> (0, -19.0086) construction
  line L10 (0, -19.0086) -> (0, -25.0086) construction
  line L11 (0, -19.0086) -> (0, -25.0086)
  circle A0 centre (9, -19.0086) radius 6
  line L12 (18, -19.0086) -> (18, -25.0086)
  line L13 (0, -19.0086) -> (0, -25.0086) construction
  line L14 (18, -19.0086) -> (18, -25.0086) construction
  line L15 (9, 0) -> (9, -25) construction
  line L16 (0, -19.0086) -> (0, -25.0086)
  line L17 (0, -0.0086) -> (0, -25.0086) construction
  line L18 (18, -25.0086) -> (0, -25.0086) construction
  line L19 (0, -25.0086) -> (18, -25.0086) construction
  line L20 (0, -25.0086) -> (18, -25.0086)
  line L21 (18, -25.0086) -> (0, -25.0086) construction
  line L22 (0, -25.0086) -> (18, -25.0086) construction
  line L23 (0, -19.0086) -> (2, -19.0086) construction
  line L24 (2, -19.0086) -> (0, -19.0086) construction
  line L25 (18, -19.0086) -> (16, -19.0086) construction
  line L26 (2, -21.0086) -> (0, -21.0086)
  circle A1 centre (9, -19.0086) radius 3.5
  circle A2 centre (9, -19.0086) radius 4.5
  line L27 (18, -19.0086) -> (16, -19.0086) construction
  line L28 (0, 0) -> (18, 0) construction
  line L29 (18, 0) -> (18, -21) construction
  line L30 (0, 0) -> (18, 0) construction
  line L31 (18, 0) -> (18, -14.5086) construction
  line L32 (0, -14.5086) -> (0, 0) construction
  line L33 (18, 0) -> (16, 0) construction
  line L34 (0, 0) -> (2, 0) construction
  line L35 (16, 0) -> (2, 0)
  line L36 (2, -2) -> (2, -12.5086)
  line L37 (16, -12.5086) -> (16, -2)
  line L38 (16, -12.5086) -> (10.1192, -7.2543)
  line L39 (9, -6.2543) -> (2, 0)
  line L40 (16, -2) -> (10.1192, -7.2543)
  line L41 (9, -8.2543) -> (2, -14.5086)
  line L42 (2, -12.5086) -> (7.8808, -7.2543)
  line L43 (9, -6.2543) -> (16, 0)
  line L44 (2, -2) -> (7.8808, -7.2543)
  line L45 (9, -8.2543) -> (16, -14.5086)
  line L46 (2, -14.5086) -> (9, -14.5086)
  line L47 (12.9686, -14.5086) -> (16, -14.5086)
  line L48 (18, -14.5086) -> (9, -14.5086) construction
  line L49 (5.0314, -14.5086) -> (0, -14.5086) construction
  point P0 (9, -0.0086)
  dimension "d80" = 9
  dimension "d79" = 7
  dimension "d81" = 2
  dimension "d83" = 2
extrude "押し出し12" cut sketch "スケッチ12" against normal blind 4 contours L43 L39 L35 | L44 L42 L36 | L38 L40 L37
sketch "スケッチ13" plane through (16.9, 6, -9) normal (-1, 0, 0) x (0, 0, 1)
  line L0 (0, 0) -> (18, 0) construction
  line L1 (0, 0) -> (18, 0) construction
  line L2 (18, 0) -> (16, 0) construction
  line L3 (0, 0) -> (2, 0) construction
  line L4 (16, 0) -> (2, 0)
  line L5 (18, 25.0086) -> (18, 19.0086)
  line L6 (18, 25.0086) -> (18, 19.0086) construction
  line L7 (18, 19.0086) -> (18, 25.0086)
  line L8 (9, 19.0086) -> (15, 19.0086) construction
  line L9 (9, 19.0086) -> (18, 19.0086) construction
  line L10 (16, 21.0086) -> (18, 21.0086)
  line L11 (14.6569, 21.0086) -> (16, 21.0086)
  line L12 (9, 19.0086) -> (9, 25.0086) construction
  line L13 (2, 21.0086) -> (3.3431, 21.0086)
  line L14 (9, 19.0086) -> (0, 19.0086) construction
  line L15 (0, 19.0086) -> (0, 25.0086) construction
  line L16 (0, 19.0086) -> (0, 25.0086)
  circle A0 centre (9, 19.0086) radius 6
  line L17 (18, 19.0086) -> (18, 25.0086)
  line L18 (0, 19.0086) -> (0, 25.0086) construction
  line L19 (18, 19.0086) -> (18, 25.0086) construction
  line L20 (9, 0) -> (9, 25) construction
  line L21 (0, 19.0086) -> (0, 25.0086)
  line L22 (0, 0.0086) -> (0, 25.0086) construction
  line L23 (18, 25.0086) -> (0, 25.0086) construction
  line L24 (0, 25.0086) -> (18, 25.0086) construction
  line L25 (0, 25.0086) -> (18, 25.0086)
  line L26 (18, 25.0086) -> (0, 25.0086) construction
  line L27 (0, 25.0086) -> (18, 25.0086) construction
  line L28 (0, 19.0086) -> (2, 19.0086) construction
  line L29 (2, 19.0086) -> (0, 19.0086) construction
  line L30 (18, 19.0086) -> (16, 19.0086) construction
  line L31 (2, 21.0086) -> (0, 21.0086)
  circle A1 centre (9, 19.0086) radius 3.5
  circle A2 centre (9, 19.0086) radius 4.5
  line L32 (18, 19.0086) -> (16, 19.0086) construction
  line L33 (18, 0) -> (18, 21) construction
  line L34 (18, 0) -> (18, 14.5086) construction
  line L35 (0, 14.5086) -> (0, 0) construction
  line L36 (2, 2) -> (2, 12.5086)
  line L37 (16, 12.5086) -> (16, 2)
  line L38 (16, 12.5086) -> (10.1192, 7.2543)
  line L39 (9, 6.2543) -> (2, 0)
  line L40 (16, 2) -> (10.1192, 7.2543)
  line L41 (9, 8.2543) -> (2, 14.5086)
  line L42 (2, 12.5086) -> (7.8808, 7.2543)
  line L43 (9, 6.2543) -> (16, 0)
  line L44 (2, 2) -> (7.8808, 7.2543)
  line L45 (9, 8.2543) -> (16, 14.5086)
  line L46 (2, 14.5086) -> (9, 14.5086)
  line L47 (12.9686, 14.5086) -> (16, 14.5086)
  line L48 (18, 14.5086) -> (9, 14.5086) construction
  line L49 (5.0314, 14.5086) -> (0, 14.5086) construction
  line L50 (18, 0) -> (18, -1.7869) construction
  line L51 (18, 0) -> (18, -1.7869) construction
  line L52 (18, -14.2956) -> (18, -14.5086) construction
  point P0 (9, -0.0086)
  point P1 (9, -25)
  point P2 (9, 6)
  point P3 (9, 0.0086)
  dimension "d93" = 2
extrude "押し出し13" cut sketch "スケッチ13" against normal blind 4 contours L4 L39 L43 | A1 | L36 L42 L44 | L37 L40 L38
sketch "スケッチ14" plane through (16.9, 6, 9) normal (-1, 0, 0) x (0, 0, 1)
  line L0 (18, -14.2956) -> (18, -14.5086) construction
  line L1 (0, 0) -> (-18, 0) construction
  line L2 (0, 0) -> (-18, 0) construction
  line L3 (-18, 0) -> (-16, 0) construction
  line L4 (0, 0) -> (-2, 0) construction
  line L5 (-16, 0) -> (-2, 0)
  line L6 (-18, 25.0086) -> (-18, 19.0086)
  line L7 (-14.6569, 21.0086) -> (-16, 21.0086)
  line L8 (-18, 25.0086) -> (-18, 19.0086) construction
  line L9 (-18, 19.0086) -> (-18, 25.0086)
  line L10 (-16, 21.0086) -> (-18, 21.0086)
  line L11 (-9, 19.0086) -> (-15, 19.0086) construction
  line L12 (-9, 19.0086) -> (-18, 19.0086) construction
  line L13 (-9, 19.0086) -> (-9, 25.0086) construction
  line L14 (0, 25.0086) -> (-18, 25.0086) construction
  line L15 (-18, 25.0086) -> (0, 25.0086) construction
  line L16 (0, 25.0086) -> (-18, 25.0086) construction
  line L17 (0, 25.0086) -> (-18, 25.0086)
  line L18 (-18, 25.0086) -> (0, 25.0086) construction
  circle A0 centre (-9, 19.0086) radius 3.5
  circle A1 centre (-9, 19.0086) radius 4.5
  line L19 (-9, 19.0086) -> (0, 19.0086) construction
  line L20 (-2, 21.0086) -> (-3.3431, 21.0086)
  line L21 (-2, 21.0086) -> (0, 21.0086)
  line L22 (-18, 19.0086) -> (-18, 25.0086) construction
  line L23 (-18, 19.0086) -> (-18, 25.0086)
  line L24 (-2, 19.0086) -> (0, 19.0086) construction
  line L25 (0, 19.0086) -> (-2, 19.0086) construction
  line L26 (-9, 6.2543) -> (-16, 0)
  line L27 (-16, 2) -> (-10.1192, 7.2543)
  line L28 (-16, 12.5086) -> (-10.1192, 7.2543)
  line L29 (-16, 12.5086) -> (-16, 2)
  line L30 (-12.9686, 14.5086) -> (-16, 14.5086)
  line L31 (-9, 8.2543) -> (-16, 14.5086)
  line L32 (-18, 14.5086) -> (-9, 14.5086) construction
  circle A2 centre (-9, 19.0086) radius 6
  line L33 (-9, 0) -> (-9, 25) construction
  line L34 (-18, 19.0086) -> (-16, 19.0086) construction
  line L35 (-18, 19.0086) -> (-16, 19.0086) construction
  line L36 (-18, 0) -> (-18, 21) construction
  line L37 (-18, 0) -> (-18, 14.5086) construction
  line L38 (-9, 6.2543) -> (-2, 0)
  line L39 (-2, 12.5086) -> (-7.8808, 7.2543)
  line L40 (-2, 2) -> (-2, 12.5086)
  line L41 (-2, 14.5086) -> (-9, 14.5086)
  line L42 (-9, 8.2543) -> (-2, 14.5086)
  line L43 (-2, 2) -> (-7.8808, 7.2543)
  line L44 (-5.0314, 14.5086) -> (0, 14.5086) construction
  line L45 (-18, 0) -> (-18, -1.7869) construction
  line L46 (-18, 0) -> (-18, -1.7869) construction
  point P0 (-9, -6)
  point P1 (9, -25)
  point P2 (-9, -0.0086)
  point P3 (-9, 6)
  point P4 (-9, 0.0086)
extrude "押し出し14" cut sketch "スケッチ14" against normal blind 3 contours A1
fillet "フィレット1" radius 2 6 edges at (-9, -21, 18.9) (9, -21, 18.9) (-9, -21, -18.9) (9, -21, -18.9) (18.9, 27, 9) (-18.9, 27, 9)
fillet "フィレット2" radius 3 4 edges at (0, 6, 20.9) (0, 6, -20.9) (20.9, 0, 0) (-20.9, 0, 0)
properties part number "ServoArm"
